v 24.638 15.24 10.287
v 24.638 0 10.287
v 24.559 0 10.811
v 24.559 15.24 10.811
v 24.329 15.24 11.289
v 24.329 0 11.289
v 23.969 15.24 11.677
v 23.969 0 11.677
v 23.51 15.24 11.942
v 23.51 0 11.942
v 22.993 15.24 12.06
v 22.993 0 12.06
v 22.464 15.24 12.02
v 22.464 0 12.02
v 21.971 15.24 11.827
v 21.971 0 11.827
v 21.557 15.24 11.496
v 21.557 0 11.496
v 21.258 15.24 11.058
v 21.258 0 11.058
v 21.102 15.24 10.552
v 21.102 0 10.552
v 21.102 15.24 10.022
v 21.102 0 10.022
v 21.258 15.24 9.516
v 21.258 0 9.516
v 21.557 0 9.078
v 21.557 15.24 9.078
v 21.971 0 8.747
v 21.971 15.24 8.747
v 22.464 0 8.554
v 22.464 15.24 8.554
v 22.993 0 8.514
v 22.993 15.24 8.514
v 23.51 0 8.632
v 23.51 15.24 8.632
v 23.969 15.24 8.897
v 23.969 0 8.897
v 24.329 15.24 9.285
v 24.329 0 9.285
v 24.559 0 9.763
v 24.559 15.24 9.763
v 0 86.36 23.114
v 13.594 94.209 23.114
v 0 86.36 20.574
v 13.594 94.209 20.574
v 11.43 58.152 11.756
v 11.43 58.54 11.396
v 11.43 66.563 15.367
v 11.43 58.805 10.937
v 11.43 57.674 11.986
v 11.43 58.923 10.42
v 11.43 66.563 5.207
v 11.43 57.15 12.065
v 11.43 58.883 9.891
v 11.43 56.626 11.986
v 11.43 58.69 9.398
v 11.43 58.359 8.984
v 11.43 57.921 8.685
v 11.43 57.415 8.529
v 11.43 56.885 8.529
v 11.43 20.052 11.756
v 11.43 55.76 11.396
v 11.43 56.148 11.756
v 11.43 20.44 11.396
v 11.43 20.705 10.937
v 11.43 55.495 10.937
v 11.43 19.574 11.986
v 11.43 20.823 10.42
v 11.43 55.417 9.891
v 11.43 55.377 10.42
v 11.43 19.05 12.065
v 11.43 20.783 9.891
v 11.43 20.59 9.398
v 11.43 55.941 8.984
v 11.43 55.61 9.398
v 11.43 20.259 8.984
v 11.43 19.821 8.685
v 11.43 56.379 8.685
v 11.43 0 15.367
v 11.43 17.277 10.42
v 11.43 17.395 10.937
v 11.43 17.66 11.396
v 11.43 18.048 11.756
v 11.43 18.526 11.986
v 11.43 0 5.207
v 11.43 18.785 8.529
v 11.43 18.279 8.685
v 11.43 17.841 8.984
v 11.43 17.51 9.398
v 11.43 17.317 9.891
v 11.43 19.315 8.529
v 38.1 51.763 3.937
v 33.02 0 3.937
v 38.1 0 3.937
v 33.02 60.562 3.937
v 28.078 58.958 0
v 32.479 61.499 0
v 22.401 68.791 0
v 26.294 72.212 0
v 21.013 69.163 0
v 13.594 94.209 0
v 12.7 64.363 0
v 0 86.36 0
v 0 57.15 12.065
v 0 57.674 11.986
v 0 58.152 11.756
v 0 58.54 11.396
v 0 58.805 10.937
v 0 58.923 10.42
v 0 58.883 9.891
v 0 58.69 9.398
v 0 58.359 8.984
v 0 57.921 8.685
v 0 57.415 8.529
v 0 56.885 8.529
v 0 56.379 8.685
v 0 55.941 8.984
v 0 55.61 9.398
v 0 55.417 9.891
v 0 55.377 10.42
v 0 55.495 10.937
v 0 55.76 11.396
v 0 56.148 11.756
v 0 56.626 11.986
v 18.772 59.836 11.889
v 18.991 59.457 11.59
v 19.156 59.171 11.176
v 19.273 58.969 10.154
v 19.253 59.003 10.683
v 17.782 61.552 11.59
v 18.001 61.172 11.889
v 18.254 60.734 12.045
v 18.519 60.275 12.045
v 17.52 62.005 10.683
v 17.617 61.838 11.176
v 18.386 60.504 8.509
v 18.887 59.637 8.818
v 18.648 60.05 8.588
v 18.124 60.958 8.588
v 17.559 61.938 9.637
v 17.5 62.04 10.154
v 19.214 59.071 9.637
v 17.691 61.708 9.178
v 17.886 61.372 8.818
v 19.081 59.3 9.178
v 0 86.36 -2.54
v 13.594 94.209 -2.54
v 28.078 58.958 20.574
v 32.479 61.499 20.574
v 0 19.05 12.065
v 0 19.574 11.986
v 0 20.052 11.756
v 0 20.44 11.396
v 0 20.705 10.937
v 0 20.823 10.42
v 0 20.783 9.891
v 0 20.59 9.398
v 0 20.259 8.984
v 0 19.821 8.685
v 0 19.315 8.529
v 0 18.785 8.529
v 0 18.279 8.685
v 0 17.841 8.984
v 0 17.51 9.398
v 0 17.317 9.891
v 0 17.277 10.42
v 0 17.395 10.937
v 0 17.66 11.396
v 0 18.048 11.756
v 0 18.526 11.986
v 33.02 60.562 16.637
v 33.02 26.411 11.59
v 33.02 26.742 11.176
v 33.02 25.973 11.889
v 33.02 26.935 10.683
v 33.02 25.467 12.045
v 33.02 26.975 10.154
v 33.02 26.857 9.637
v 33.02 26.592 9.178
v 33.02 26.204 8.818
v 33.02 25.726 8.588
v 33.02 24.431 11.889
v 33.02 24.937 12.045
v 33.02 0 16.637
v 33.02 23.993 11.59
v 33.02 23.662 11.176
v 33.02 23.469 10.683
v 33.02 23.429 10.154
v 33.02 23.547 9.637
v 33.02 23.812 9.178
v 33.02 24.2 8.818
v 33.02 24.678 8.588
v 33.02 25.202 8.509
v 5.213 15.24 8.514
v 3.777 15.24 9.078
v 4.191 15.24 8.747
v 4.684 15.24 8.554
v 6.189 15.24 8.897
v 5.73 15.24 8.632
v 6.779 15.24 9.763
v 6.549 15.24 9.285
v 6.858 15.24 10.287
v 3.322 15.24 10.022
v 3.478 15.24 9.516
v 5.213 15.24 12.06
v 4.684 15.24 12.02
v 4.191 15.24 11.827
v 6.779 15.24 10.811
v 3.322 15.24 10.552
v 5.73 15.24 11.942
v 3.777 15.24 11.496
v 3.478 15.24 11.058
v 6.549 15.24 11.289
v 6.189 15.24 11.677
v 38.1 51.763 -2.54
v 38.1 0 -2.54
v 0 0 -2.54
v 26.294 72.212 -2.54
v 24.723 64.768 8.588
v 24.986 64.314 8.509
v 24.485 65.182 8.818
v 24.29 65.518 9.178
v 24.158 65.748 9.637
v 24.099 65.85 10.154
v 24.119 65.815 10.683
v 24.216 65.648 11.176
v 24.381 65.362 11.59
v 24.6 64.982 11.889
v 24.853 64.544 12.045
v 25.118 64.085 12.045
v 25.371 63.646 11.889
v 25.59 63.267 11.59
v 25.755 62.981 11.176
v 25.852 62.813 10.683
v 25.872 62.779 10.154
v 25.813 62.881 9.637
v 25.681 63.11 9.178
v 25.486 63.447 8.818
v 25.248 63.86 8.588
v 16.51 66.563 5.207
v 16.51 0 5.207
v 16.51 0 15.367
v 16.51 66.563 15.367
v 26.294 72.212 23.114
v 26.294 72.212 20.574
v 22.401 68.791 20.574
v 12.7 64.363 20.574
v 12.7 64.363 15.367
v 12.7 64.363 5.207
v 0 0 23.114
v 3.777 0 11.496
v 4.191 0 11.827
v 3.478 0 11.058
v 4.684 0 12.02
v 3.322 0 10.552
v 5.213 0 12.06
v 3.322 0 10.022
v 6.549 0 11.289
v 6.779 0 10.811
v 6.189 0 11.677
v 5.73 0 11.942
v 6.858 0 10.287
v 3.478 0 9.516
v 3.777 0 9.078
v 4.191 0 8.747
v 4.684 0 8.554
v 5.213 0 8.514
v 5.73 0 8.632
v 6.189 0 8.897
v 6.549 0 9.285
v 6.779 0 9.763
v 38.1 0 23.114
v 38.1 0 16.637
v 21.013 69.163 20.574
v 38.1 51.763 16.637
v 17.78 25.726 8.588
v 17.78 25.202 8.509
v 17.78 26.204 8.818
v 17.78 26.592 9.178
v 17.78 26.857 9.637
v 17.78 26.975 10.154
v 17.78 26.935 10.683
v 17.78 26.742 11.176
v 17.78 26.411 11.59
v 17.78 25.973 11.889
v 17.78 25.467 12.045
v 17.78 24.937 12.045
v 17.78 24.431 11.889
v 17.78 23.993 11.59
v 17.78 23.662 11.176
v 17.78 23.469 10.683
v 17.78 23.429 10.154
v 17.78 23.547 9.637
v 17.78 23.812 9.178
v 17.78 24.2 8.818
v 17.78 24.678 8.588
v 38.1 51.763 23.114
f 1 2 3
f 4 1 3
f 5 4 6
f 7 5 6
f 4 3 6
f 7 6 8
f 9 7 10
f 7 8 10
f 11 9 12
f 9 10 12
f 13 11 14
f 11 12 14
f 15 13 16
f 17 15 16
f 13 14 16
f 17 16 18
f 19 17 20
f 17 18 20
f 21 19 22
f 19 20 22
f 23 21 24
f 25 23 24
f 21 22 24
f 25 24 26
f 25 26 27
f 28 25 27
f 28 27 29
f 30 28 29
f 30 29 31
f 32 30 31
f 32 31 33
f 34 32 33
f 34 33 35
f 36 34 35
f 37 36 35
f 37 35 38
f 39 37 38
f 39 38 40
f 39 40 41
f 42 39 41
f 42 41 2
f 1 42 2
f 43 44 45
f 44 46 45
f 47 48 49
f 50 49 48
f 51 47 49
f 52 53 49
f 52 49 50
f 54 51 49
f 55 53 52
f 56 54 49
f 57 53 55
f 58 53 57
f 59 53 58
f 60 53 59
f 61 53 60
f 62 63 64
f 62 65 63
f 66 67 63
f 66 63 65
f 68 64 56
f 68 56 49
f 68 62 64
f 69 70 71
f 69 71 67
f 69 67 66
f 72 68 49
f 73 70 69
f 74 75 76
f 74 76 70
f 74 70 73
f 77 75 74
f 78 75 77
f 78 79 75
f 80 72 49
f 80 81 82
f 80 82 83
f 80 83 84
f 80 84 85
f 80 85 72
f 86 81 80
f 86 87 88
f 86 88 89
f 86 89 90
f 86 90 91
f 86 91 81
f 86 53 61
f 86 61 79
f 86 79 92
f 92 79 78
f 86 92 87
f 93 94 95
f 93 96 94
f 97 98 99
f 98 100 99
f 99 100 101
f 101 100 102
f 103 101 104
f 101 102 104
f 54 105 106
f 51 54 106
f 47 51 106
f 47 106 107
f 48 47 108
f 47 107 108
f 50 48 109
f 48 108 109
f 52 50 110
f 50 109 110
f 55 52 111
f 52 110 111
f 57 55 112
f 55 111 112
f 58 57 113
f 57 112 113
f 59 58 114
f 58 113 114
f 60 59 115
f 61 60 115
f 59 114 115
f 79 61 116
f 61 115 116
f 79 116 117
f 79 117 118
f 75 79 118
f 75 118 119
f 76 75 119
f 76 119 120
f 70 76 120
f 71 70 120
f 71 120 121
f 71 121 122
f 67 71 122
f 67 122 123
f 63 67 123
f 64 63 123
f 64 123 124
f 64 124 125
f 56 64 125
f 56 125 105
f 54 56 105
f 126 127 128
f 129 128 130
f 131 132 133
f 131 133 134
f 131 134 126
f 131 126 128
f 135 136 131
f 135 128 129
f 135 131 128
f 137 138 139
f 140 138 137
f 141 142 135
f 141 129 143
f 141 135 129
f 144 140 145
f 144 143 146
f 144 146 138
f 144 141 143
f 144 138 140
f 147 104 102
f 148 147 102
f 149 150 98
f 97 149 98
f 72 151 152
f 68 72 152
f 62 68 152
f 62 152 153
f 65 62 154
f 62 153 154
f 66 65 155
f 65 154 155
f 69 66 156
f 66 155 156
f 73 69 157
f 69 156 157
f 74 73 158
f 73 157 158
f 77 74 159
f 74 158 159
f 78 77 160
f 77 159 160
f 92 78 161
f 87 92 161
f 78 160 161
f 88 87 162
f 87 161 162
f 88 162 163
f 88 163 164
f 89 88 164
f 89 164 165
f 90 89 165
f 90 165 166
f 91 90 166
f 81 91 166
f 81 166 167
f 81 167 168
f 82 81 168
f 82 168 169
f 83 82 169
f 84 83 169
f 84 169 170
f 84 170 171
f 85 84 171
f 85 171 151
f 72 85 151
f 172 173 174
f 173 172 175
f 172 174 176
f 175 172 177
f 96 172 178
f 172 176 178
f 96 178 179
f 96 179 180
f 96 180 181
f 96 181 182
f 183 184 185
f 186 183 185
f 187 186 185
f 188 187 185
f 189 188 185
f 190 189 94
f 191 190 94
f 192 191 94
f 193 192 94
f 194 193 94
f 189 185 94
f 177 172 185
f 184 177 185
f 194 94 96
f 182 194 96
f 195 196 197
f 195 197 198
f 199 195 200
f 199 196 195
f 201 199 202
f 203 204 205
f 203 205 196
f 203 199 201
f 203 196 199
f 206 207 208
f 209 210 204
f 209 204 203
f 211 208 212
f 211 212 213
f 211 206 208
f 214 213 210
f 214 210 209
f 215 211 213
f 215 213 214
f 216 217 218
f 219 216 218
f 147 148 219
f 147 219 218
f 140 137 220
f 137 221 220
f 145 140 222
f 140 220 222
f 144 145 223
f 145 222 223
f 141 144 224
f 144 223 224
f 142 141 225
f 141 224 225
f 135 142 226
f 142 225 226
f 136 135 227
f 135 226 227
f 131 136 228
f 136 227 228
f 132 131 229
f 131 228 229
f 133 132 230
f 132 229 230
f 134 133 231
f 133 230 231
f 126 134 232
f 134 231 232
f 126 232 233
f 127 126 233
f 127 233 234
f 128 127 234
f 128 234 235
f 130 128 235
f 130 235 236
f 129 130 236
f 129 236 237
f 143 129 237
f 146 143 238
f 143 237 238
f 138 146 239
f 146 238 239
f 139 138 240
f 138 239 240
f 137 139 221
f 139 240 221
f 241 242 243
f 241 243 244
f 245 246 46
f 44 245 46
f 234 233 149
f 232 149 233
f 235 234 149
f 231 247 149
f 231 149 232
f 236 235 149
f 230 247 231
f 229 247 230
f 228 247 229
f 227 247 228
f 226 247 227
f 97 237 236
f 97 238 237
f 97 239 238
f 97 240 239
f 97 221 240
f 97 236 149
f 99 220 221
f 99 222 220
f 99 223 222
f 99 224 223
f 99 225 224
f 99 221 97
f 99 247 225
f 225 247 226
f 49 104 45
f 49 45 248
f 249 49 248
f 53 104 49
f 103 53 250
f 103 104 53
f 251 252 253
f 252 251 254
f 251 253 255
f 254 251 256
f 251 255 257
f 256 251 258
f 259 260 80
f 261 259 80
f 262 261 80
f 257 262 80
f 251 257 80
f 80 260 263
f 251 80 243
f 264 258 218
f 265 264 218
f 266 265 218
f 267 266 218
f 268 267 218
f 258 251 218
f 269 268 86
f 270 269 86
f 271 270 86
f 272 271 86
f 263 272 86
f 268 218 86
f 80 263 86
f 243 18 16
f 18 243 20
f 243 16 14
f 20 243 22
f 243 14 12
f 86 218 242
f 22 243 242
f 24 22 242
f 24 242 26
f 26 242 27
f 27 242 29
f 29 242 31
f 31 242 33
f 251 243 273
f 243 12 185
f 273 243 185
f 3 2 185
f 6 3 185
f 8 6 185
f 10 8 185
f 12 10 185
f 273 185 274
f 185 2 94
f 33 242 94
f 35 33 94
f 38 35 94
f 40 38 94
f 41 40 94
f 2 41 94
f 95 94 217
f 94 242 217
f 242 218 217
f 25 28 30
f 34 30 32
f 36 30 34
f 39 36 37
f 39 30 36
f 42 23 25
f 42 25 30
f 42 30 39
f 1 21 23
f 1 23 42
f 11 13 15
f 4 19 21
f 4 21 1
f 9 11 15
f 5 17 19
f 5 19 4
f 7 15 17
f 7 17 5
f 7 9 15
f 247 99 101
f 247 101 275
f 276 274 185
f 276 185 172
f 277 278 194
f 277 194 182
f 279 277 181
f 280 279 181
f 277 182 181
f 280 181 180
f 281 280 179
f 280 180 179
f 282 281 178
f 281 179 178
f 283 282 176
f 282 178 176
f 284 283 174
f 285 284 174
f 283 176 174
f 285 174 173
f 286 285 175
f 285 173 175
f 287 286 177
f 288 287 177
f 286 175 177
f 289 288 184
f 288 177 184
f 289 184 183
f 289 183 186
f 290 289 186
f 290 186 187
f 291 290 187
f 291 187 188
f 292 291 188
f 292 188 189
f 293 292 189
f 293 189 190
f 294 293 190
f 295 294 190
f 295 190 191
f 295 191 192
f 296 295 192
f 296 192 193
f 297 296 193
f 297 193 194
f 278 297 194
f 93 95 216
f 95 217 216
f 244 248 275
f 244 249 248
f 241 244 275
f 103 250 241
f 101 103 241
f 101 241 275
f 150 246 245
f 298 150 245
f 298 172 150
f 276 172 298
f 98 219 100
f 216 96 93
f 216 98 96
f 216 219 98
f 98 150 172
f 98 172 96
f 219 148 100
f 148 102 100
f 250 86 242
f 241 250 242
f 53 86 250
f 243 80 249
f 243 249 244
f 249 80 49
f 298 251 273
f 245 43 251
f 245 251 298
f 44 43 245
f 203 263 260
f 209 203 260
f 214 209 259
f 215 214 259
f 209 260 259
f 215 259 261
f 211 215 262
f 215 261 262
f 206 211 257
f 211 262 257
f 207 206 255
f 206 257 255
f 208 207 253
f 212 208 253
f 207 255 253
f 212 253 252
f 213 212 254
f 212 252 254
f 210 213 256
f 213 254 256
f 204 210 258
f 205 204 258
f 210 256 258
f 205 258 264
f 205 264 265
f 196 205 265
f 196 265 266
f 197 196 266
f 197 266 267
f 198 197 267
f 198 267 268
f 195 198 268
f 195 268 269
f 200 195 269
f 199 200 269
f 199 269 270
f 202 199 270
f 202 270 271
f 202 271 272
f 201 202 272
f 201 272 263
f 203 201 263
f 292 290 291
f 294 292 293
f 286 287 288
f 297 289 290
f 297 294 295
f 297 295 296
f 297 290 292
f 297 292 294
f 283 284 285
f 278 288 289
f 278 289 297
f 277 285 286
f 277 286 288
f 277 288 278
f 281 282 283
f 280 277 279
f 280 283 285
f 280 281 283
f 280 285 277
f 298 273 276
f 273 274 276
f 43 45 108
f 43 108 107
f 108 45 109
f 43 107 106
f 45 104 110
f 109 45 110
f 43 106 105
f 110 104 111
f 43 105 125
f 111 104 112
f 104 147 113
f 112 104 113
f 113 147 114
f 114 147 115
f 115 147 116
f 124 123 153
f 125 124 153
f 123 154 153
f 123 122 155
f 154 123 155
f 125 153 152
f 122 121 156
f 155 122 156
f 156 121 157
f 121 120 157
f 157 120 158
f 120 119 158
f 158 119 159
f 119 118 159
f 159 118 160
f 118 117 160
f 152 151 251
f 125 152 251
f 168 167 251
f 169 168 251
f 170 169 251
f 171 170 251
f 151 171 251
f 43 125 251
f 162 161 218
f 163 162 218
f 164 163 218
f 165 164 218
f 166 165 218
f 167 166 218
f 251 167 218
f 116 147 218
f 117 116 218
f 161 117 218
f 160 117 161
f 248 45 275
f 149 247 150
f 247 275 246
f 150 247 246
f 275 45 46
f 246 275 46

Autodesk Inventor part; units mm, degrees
ref_plane "YZ Plane" through (0, 0, 0) normal (1, 0, 0) x (0, 1, 0)
ref_plane "XZ Plane" through (0, 0, 0) normal (0, 1, 0) x (-1, 0, 0)
sketch "Sketch1" plane through (0, 0, 0) normal (0, 0, 1) x (1, 0, 0)
  line L0 (0, 0) -> (38.1, 0)
  line L1 (38.1, 0) -> (38.1, 51.7633)
  line L2 (0, 86.36) -> (0, 0)
  line L3 (0, 86.36) -> (13.5942, 94.2086)
  line L4 (0, 86.36) -> (12.7, 64.363)
  line L5 (12.7, 64.363) -> (26.2942, 72.2116)
  line L6 (26.2942, 72.2116) -> (13.5942, 94.2086)
  line L7 (26.2942, 72.2116) -> (38.1, 51.7633)
  dimension "d0" = 15.6972
  dimension "d1" = 25.4
  dimension "d2" = 38.1
  dimension "d3" = 86.36
  dimension "d4" = 120
extrude "Extrusion1" add sketch "Sketch1" along normal blind 20.574 contours L2 L4 L5 L7 L1 L0
sketch "Sketch2" plane through (0, 0, 20.574) normal (0, 0, 1) x (1, 0, 0)
  line L0 (0, 86.36) -> (0, 0) projected
  line L1 (0, 0) -> (38.1, 0) projected
  line L2 (38.1, 0) -> (38.1, 51.7633) projected
  line L3 (38.1, 51.7633) -> (26.2942, 72.2116) projected
  line L4 (26.2942, 72.2116) -> (12.7, 64.363) projected
  line L5 (12.7, 64.363) -> (0, 86.36) projected
  line L6 (26.2942, 72.2116) -> (13.5942, 94.2086)
  line L7 (13.5942, 94.2086) -> (0, 86.36)
  line L8 (38.1, 51.7633) -> (26.2942, 72.2116) projected
extrude "Extrusion2" add sketch "Sketch2" along normal blind 2.54
ref_plane "Work Plane1" through (0, 0, 10.287) normal (0, 0, -1) x (-1, 0, 0)
mirror "Mirror1" about plane through (0, 0, 10.287) normal (0, 0, -1) of "Extrusion2"
sketch "Sketch3" plane through (0, 0, 23.114) normal (0, -1, 0) x (1, 0, 0)
  line L0 (38.1, -25.654) -> (38.1, 0) projected
  line L1 (38.1, -6.477) -> (33.02, -6.477)
  line L2 (33.02, -6.477) -> (33.02, -19.177)
  line L3 (33.02, -19.177) -> (38.1, -19.177)
  line L4 (38.1, -19.177) -> (38.1, -6.477)
  point P0 (0, -23.114)
  point P1 (38.1, -12.827)
  dimension "d9" = 12.7
  dimension "d10" = 6.35
  dimension "d11" = 5.08
extrude "Extrusion3" cut sketch "Sketch3" against normal blind 76.2
sketch "Sketch4" plane through (33.02, 0, 16.637) normal (1, 0, 0) x (0, 0, -1)
  circle A0 centre (6.35, 25.202) radius 1.778 projected
  point P0 (16.637, 0)
extrude "Extrusion4" cut sketch "Sketch4" against normal blind 15.24
sketch "Sketch5" plane through (13.5942, 94.2086, 23.114) normal (0.8660254, 0.5, 0) x (0, 0, -1)
  line L0 (23.114, -25.4) -> (2.54, -25.4) projected
  line L1 (23.114, -25.4) -> (2.54, -25.4)
  line L2 (2.54, -25.4) -> (2.54, -37.7698)
  line L3 (2.54, -37.7698) -> (23.114, -37.7698)
  line L4 (23.114, -37.7698) -> (23.114, -25.4)
  point P0 (23.114, -74.79)
  dimension "d16" = 12.3698
extrude "Extrusion5" cut sketch "Sketch5" against normal blind 5.08
chamfer "Chamfer1" distance 1.016 angle 45 1 edges at (21.893, 69.6706, 10.287)
sketch "Sketch6" plane through (9.1948, 91.6686, 23.114) normal (0.8660254, 0.5, 0) x (0, 0, -1)
  line L0 (22.86, -25.4) -> (2.54, -25.4) projected
  line L1 (23.114, -37.7698) -> (2.54, -37.7698) projected
  circle A0 centre (12.827, -31.5849) radius 1.778
  line L2 (2.54, -37.7698) -> (2.54, 0) projected
  line L3 (2.54, -25.4) -> (2.54, -37.7698)
  point P0 (23.114, -74.79)
  point P1 (12.827, -37.7698)
  point P2 (2.54, -31.5849)
  dimension "d22" = 3.556
extrude "Extrusion6" cut sketch "Sketch6" against normal blind 7.62
ref_plane "Work Plane2" through (0, 0, 10.287) normal (0, 0, 1) x (1, 0, 0)
sketch "Sketch7" plane through (0, 0, 10.287) normal (0, 0, 1) x (1, 0, 0)
  line L0 (12.7, 64.363) -> (0, 86.36) projected
  line L1 (21.0149, 69.1636) -> (12.7, 64.363) projected
  line L2 (0, 0) -> (38.1, 0) projected
  line L3 (16.8574, 0) -> (11.3142, 0)
  line L4 (16.51, 66.5627) -> (11.43, 66.5627)
  line L5 (11.43, 66.5627) -> (11.43, 0)
  line L6 (11.43, 0) -> (16.51, 0)
  line L7 (16.51, 0) -> (16.51, 66.5627)
  dimension "d26" = 5.08
extrude "Extrusion7" cut sketch "Sketch7" along normal mid plane 10.16 contours L1 L7 L2 L5 L0
sketch "Sketch8" plane through (0, 0, 23.114) normal (-1, 0, 0) x (0, 0, 1)
  circle A0 centre (-12.827, 57.15) radius 1.778 projected
  circle A1 centre (-12.827, 19.05) radius 1.778 projected
  point P0 (-23.114, 0)
extrude "Extrusion8" cut sketch "Sketch8" against normal blind 15.24
sketch "Sketch9" plane through (0, 0, 23.114) normal (0, -1, 0) x (1, 0, 0)
  circle A0 centre (5.08, -12.827) radius 1.778 projected
  circle A1 centre (22.86, -12.827) radius 1.778 projected
  point P0 (0, -23.114)
extrude "Extrusion9" cut sketch "Sketch9" against normal blind 15.24
equation "\"d10\" = 0.5 * d9"
properties part number "PALM 3"
